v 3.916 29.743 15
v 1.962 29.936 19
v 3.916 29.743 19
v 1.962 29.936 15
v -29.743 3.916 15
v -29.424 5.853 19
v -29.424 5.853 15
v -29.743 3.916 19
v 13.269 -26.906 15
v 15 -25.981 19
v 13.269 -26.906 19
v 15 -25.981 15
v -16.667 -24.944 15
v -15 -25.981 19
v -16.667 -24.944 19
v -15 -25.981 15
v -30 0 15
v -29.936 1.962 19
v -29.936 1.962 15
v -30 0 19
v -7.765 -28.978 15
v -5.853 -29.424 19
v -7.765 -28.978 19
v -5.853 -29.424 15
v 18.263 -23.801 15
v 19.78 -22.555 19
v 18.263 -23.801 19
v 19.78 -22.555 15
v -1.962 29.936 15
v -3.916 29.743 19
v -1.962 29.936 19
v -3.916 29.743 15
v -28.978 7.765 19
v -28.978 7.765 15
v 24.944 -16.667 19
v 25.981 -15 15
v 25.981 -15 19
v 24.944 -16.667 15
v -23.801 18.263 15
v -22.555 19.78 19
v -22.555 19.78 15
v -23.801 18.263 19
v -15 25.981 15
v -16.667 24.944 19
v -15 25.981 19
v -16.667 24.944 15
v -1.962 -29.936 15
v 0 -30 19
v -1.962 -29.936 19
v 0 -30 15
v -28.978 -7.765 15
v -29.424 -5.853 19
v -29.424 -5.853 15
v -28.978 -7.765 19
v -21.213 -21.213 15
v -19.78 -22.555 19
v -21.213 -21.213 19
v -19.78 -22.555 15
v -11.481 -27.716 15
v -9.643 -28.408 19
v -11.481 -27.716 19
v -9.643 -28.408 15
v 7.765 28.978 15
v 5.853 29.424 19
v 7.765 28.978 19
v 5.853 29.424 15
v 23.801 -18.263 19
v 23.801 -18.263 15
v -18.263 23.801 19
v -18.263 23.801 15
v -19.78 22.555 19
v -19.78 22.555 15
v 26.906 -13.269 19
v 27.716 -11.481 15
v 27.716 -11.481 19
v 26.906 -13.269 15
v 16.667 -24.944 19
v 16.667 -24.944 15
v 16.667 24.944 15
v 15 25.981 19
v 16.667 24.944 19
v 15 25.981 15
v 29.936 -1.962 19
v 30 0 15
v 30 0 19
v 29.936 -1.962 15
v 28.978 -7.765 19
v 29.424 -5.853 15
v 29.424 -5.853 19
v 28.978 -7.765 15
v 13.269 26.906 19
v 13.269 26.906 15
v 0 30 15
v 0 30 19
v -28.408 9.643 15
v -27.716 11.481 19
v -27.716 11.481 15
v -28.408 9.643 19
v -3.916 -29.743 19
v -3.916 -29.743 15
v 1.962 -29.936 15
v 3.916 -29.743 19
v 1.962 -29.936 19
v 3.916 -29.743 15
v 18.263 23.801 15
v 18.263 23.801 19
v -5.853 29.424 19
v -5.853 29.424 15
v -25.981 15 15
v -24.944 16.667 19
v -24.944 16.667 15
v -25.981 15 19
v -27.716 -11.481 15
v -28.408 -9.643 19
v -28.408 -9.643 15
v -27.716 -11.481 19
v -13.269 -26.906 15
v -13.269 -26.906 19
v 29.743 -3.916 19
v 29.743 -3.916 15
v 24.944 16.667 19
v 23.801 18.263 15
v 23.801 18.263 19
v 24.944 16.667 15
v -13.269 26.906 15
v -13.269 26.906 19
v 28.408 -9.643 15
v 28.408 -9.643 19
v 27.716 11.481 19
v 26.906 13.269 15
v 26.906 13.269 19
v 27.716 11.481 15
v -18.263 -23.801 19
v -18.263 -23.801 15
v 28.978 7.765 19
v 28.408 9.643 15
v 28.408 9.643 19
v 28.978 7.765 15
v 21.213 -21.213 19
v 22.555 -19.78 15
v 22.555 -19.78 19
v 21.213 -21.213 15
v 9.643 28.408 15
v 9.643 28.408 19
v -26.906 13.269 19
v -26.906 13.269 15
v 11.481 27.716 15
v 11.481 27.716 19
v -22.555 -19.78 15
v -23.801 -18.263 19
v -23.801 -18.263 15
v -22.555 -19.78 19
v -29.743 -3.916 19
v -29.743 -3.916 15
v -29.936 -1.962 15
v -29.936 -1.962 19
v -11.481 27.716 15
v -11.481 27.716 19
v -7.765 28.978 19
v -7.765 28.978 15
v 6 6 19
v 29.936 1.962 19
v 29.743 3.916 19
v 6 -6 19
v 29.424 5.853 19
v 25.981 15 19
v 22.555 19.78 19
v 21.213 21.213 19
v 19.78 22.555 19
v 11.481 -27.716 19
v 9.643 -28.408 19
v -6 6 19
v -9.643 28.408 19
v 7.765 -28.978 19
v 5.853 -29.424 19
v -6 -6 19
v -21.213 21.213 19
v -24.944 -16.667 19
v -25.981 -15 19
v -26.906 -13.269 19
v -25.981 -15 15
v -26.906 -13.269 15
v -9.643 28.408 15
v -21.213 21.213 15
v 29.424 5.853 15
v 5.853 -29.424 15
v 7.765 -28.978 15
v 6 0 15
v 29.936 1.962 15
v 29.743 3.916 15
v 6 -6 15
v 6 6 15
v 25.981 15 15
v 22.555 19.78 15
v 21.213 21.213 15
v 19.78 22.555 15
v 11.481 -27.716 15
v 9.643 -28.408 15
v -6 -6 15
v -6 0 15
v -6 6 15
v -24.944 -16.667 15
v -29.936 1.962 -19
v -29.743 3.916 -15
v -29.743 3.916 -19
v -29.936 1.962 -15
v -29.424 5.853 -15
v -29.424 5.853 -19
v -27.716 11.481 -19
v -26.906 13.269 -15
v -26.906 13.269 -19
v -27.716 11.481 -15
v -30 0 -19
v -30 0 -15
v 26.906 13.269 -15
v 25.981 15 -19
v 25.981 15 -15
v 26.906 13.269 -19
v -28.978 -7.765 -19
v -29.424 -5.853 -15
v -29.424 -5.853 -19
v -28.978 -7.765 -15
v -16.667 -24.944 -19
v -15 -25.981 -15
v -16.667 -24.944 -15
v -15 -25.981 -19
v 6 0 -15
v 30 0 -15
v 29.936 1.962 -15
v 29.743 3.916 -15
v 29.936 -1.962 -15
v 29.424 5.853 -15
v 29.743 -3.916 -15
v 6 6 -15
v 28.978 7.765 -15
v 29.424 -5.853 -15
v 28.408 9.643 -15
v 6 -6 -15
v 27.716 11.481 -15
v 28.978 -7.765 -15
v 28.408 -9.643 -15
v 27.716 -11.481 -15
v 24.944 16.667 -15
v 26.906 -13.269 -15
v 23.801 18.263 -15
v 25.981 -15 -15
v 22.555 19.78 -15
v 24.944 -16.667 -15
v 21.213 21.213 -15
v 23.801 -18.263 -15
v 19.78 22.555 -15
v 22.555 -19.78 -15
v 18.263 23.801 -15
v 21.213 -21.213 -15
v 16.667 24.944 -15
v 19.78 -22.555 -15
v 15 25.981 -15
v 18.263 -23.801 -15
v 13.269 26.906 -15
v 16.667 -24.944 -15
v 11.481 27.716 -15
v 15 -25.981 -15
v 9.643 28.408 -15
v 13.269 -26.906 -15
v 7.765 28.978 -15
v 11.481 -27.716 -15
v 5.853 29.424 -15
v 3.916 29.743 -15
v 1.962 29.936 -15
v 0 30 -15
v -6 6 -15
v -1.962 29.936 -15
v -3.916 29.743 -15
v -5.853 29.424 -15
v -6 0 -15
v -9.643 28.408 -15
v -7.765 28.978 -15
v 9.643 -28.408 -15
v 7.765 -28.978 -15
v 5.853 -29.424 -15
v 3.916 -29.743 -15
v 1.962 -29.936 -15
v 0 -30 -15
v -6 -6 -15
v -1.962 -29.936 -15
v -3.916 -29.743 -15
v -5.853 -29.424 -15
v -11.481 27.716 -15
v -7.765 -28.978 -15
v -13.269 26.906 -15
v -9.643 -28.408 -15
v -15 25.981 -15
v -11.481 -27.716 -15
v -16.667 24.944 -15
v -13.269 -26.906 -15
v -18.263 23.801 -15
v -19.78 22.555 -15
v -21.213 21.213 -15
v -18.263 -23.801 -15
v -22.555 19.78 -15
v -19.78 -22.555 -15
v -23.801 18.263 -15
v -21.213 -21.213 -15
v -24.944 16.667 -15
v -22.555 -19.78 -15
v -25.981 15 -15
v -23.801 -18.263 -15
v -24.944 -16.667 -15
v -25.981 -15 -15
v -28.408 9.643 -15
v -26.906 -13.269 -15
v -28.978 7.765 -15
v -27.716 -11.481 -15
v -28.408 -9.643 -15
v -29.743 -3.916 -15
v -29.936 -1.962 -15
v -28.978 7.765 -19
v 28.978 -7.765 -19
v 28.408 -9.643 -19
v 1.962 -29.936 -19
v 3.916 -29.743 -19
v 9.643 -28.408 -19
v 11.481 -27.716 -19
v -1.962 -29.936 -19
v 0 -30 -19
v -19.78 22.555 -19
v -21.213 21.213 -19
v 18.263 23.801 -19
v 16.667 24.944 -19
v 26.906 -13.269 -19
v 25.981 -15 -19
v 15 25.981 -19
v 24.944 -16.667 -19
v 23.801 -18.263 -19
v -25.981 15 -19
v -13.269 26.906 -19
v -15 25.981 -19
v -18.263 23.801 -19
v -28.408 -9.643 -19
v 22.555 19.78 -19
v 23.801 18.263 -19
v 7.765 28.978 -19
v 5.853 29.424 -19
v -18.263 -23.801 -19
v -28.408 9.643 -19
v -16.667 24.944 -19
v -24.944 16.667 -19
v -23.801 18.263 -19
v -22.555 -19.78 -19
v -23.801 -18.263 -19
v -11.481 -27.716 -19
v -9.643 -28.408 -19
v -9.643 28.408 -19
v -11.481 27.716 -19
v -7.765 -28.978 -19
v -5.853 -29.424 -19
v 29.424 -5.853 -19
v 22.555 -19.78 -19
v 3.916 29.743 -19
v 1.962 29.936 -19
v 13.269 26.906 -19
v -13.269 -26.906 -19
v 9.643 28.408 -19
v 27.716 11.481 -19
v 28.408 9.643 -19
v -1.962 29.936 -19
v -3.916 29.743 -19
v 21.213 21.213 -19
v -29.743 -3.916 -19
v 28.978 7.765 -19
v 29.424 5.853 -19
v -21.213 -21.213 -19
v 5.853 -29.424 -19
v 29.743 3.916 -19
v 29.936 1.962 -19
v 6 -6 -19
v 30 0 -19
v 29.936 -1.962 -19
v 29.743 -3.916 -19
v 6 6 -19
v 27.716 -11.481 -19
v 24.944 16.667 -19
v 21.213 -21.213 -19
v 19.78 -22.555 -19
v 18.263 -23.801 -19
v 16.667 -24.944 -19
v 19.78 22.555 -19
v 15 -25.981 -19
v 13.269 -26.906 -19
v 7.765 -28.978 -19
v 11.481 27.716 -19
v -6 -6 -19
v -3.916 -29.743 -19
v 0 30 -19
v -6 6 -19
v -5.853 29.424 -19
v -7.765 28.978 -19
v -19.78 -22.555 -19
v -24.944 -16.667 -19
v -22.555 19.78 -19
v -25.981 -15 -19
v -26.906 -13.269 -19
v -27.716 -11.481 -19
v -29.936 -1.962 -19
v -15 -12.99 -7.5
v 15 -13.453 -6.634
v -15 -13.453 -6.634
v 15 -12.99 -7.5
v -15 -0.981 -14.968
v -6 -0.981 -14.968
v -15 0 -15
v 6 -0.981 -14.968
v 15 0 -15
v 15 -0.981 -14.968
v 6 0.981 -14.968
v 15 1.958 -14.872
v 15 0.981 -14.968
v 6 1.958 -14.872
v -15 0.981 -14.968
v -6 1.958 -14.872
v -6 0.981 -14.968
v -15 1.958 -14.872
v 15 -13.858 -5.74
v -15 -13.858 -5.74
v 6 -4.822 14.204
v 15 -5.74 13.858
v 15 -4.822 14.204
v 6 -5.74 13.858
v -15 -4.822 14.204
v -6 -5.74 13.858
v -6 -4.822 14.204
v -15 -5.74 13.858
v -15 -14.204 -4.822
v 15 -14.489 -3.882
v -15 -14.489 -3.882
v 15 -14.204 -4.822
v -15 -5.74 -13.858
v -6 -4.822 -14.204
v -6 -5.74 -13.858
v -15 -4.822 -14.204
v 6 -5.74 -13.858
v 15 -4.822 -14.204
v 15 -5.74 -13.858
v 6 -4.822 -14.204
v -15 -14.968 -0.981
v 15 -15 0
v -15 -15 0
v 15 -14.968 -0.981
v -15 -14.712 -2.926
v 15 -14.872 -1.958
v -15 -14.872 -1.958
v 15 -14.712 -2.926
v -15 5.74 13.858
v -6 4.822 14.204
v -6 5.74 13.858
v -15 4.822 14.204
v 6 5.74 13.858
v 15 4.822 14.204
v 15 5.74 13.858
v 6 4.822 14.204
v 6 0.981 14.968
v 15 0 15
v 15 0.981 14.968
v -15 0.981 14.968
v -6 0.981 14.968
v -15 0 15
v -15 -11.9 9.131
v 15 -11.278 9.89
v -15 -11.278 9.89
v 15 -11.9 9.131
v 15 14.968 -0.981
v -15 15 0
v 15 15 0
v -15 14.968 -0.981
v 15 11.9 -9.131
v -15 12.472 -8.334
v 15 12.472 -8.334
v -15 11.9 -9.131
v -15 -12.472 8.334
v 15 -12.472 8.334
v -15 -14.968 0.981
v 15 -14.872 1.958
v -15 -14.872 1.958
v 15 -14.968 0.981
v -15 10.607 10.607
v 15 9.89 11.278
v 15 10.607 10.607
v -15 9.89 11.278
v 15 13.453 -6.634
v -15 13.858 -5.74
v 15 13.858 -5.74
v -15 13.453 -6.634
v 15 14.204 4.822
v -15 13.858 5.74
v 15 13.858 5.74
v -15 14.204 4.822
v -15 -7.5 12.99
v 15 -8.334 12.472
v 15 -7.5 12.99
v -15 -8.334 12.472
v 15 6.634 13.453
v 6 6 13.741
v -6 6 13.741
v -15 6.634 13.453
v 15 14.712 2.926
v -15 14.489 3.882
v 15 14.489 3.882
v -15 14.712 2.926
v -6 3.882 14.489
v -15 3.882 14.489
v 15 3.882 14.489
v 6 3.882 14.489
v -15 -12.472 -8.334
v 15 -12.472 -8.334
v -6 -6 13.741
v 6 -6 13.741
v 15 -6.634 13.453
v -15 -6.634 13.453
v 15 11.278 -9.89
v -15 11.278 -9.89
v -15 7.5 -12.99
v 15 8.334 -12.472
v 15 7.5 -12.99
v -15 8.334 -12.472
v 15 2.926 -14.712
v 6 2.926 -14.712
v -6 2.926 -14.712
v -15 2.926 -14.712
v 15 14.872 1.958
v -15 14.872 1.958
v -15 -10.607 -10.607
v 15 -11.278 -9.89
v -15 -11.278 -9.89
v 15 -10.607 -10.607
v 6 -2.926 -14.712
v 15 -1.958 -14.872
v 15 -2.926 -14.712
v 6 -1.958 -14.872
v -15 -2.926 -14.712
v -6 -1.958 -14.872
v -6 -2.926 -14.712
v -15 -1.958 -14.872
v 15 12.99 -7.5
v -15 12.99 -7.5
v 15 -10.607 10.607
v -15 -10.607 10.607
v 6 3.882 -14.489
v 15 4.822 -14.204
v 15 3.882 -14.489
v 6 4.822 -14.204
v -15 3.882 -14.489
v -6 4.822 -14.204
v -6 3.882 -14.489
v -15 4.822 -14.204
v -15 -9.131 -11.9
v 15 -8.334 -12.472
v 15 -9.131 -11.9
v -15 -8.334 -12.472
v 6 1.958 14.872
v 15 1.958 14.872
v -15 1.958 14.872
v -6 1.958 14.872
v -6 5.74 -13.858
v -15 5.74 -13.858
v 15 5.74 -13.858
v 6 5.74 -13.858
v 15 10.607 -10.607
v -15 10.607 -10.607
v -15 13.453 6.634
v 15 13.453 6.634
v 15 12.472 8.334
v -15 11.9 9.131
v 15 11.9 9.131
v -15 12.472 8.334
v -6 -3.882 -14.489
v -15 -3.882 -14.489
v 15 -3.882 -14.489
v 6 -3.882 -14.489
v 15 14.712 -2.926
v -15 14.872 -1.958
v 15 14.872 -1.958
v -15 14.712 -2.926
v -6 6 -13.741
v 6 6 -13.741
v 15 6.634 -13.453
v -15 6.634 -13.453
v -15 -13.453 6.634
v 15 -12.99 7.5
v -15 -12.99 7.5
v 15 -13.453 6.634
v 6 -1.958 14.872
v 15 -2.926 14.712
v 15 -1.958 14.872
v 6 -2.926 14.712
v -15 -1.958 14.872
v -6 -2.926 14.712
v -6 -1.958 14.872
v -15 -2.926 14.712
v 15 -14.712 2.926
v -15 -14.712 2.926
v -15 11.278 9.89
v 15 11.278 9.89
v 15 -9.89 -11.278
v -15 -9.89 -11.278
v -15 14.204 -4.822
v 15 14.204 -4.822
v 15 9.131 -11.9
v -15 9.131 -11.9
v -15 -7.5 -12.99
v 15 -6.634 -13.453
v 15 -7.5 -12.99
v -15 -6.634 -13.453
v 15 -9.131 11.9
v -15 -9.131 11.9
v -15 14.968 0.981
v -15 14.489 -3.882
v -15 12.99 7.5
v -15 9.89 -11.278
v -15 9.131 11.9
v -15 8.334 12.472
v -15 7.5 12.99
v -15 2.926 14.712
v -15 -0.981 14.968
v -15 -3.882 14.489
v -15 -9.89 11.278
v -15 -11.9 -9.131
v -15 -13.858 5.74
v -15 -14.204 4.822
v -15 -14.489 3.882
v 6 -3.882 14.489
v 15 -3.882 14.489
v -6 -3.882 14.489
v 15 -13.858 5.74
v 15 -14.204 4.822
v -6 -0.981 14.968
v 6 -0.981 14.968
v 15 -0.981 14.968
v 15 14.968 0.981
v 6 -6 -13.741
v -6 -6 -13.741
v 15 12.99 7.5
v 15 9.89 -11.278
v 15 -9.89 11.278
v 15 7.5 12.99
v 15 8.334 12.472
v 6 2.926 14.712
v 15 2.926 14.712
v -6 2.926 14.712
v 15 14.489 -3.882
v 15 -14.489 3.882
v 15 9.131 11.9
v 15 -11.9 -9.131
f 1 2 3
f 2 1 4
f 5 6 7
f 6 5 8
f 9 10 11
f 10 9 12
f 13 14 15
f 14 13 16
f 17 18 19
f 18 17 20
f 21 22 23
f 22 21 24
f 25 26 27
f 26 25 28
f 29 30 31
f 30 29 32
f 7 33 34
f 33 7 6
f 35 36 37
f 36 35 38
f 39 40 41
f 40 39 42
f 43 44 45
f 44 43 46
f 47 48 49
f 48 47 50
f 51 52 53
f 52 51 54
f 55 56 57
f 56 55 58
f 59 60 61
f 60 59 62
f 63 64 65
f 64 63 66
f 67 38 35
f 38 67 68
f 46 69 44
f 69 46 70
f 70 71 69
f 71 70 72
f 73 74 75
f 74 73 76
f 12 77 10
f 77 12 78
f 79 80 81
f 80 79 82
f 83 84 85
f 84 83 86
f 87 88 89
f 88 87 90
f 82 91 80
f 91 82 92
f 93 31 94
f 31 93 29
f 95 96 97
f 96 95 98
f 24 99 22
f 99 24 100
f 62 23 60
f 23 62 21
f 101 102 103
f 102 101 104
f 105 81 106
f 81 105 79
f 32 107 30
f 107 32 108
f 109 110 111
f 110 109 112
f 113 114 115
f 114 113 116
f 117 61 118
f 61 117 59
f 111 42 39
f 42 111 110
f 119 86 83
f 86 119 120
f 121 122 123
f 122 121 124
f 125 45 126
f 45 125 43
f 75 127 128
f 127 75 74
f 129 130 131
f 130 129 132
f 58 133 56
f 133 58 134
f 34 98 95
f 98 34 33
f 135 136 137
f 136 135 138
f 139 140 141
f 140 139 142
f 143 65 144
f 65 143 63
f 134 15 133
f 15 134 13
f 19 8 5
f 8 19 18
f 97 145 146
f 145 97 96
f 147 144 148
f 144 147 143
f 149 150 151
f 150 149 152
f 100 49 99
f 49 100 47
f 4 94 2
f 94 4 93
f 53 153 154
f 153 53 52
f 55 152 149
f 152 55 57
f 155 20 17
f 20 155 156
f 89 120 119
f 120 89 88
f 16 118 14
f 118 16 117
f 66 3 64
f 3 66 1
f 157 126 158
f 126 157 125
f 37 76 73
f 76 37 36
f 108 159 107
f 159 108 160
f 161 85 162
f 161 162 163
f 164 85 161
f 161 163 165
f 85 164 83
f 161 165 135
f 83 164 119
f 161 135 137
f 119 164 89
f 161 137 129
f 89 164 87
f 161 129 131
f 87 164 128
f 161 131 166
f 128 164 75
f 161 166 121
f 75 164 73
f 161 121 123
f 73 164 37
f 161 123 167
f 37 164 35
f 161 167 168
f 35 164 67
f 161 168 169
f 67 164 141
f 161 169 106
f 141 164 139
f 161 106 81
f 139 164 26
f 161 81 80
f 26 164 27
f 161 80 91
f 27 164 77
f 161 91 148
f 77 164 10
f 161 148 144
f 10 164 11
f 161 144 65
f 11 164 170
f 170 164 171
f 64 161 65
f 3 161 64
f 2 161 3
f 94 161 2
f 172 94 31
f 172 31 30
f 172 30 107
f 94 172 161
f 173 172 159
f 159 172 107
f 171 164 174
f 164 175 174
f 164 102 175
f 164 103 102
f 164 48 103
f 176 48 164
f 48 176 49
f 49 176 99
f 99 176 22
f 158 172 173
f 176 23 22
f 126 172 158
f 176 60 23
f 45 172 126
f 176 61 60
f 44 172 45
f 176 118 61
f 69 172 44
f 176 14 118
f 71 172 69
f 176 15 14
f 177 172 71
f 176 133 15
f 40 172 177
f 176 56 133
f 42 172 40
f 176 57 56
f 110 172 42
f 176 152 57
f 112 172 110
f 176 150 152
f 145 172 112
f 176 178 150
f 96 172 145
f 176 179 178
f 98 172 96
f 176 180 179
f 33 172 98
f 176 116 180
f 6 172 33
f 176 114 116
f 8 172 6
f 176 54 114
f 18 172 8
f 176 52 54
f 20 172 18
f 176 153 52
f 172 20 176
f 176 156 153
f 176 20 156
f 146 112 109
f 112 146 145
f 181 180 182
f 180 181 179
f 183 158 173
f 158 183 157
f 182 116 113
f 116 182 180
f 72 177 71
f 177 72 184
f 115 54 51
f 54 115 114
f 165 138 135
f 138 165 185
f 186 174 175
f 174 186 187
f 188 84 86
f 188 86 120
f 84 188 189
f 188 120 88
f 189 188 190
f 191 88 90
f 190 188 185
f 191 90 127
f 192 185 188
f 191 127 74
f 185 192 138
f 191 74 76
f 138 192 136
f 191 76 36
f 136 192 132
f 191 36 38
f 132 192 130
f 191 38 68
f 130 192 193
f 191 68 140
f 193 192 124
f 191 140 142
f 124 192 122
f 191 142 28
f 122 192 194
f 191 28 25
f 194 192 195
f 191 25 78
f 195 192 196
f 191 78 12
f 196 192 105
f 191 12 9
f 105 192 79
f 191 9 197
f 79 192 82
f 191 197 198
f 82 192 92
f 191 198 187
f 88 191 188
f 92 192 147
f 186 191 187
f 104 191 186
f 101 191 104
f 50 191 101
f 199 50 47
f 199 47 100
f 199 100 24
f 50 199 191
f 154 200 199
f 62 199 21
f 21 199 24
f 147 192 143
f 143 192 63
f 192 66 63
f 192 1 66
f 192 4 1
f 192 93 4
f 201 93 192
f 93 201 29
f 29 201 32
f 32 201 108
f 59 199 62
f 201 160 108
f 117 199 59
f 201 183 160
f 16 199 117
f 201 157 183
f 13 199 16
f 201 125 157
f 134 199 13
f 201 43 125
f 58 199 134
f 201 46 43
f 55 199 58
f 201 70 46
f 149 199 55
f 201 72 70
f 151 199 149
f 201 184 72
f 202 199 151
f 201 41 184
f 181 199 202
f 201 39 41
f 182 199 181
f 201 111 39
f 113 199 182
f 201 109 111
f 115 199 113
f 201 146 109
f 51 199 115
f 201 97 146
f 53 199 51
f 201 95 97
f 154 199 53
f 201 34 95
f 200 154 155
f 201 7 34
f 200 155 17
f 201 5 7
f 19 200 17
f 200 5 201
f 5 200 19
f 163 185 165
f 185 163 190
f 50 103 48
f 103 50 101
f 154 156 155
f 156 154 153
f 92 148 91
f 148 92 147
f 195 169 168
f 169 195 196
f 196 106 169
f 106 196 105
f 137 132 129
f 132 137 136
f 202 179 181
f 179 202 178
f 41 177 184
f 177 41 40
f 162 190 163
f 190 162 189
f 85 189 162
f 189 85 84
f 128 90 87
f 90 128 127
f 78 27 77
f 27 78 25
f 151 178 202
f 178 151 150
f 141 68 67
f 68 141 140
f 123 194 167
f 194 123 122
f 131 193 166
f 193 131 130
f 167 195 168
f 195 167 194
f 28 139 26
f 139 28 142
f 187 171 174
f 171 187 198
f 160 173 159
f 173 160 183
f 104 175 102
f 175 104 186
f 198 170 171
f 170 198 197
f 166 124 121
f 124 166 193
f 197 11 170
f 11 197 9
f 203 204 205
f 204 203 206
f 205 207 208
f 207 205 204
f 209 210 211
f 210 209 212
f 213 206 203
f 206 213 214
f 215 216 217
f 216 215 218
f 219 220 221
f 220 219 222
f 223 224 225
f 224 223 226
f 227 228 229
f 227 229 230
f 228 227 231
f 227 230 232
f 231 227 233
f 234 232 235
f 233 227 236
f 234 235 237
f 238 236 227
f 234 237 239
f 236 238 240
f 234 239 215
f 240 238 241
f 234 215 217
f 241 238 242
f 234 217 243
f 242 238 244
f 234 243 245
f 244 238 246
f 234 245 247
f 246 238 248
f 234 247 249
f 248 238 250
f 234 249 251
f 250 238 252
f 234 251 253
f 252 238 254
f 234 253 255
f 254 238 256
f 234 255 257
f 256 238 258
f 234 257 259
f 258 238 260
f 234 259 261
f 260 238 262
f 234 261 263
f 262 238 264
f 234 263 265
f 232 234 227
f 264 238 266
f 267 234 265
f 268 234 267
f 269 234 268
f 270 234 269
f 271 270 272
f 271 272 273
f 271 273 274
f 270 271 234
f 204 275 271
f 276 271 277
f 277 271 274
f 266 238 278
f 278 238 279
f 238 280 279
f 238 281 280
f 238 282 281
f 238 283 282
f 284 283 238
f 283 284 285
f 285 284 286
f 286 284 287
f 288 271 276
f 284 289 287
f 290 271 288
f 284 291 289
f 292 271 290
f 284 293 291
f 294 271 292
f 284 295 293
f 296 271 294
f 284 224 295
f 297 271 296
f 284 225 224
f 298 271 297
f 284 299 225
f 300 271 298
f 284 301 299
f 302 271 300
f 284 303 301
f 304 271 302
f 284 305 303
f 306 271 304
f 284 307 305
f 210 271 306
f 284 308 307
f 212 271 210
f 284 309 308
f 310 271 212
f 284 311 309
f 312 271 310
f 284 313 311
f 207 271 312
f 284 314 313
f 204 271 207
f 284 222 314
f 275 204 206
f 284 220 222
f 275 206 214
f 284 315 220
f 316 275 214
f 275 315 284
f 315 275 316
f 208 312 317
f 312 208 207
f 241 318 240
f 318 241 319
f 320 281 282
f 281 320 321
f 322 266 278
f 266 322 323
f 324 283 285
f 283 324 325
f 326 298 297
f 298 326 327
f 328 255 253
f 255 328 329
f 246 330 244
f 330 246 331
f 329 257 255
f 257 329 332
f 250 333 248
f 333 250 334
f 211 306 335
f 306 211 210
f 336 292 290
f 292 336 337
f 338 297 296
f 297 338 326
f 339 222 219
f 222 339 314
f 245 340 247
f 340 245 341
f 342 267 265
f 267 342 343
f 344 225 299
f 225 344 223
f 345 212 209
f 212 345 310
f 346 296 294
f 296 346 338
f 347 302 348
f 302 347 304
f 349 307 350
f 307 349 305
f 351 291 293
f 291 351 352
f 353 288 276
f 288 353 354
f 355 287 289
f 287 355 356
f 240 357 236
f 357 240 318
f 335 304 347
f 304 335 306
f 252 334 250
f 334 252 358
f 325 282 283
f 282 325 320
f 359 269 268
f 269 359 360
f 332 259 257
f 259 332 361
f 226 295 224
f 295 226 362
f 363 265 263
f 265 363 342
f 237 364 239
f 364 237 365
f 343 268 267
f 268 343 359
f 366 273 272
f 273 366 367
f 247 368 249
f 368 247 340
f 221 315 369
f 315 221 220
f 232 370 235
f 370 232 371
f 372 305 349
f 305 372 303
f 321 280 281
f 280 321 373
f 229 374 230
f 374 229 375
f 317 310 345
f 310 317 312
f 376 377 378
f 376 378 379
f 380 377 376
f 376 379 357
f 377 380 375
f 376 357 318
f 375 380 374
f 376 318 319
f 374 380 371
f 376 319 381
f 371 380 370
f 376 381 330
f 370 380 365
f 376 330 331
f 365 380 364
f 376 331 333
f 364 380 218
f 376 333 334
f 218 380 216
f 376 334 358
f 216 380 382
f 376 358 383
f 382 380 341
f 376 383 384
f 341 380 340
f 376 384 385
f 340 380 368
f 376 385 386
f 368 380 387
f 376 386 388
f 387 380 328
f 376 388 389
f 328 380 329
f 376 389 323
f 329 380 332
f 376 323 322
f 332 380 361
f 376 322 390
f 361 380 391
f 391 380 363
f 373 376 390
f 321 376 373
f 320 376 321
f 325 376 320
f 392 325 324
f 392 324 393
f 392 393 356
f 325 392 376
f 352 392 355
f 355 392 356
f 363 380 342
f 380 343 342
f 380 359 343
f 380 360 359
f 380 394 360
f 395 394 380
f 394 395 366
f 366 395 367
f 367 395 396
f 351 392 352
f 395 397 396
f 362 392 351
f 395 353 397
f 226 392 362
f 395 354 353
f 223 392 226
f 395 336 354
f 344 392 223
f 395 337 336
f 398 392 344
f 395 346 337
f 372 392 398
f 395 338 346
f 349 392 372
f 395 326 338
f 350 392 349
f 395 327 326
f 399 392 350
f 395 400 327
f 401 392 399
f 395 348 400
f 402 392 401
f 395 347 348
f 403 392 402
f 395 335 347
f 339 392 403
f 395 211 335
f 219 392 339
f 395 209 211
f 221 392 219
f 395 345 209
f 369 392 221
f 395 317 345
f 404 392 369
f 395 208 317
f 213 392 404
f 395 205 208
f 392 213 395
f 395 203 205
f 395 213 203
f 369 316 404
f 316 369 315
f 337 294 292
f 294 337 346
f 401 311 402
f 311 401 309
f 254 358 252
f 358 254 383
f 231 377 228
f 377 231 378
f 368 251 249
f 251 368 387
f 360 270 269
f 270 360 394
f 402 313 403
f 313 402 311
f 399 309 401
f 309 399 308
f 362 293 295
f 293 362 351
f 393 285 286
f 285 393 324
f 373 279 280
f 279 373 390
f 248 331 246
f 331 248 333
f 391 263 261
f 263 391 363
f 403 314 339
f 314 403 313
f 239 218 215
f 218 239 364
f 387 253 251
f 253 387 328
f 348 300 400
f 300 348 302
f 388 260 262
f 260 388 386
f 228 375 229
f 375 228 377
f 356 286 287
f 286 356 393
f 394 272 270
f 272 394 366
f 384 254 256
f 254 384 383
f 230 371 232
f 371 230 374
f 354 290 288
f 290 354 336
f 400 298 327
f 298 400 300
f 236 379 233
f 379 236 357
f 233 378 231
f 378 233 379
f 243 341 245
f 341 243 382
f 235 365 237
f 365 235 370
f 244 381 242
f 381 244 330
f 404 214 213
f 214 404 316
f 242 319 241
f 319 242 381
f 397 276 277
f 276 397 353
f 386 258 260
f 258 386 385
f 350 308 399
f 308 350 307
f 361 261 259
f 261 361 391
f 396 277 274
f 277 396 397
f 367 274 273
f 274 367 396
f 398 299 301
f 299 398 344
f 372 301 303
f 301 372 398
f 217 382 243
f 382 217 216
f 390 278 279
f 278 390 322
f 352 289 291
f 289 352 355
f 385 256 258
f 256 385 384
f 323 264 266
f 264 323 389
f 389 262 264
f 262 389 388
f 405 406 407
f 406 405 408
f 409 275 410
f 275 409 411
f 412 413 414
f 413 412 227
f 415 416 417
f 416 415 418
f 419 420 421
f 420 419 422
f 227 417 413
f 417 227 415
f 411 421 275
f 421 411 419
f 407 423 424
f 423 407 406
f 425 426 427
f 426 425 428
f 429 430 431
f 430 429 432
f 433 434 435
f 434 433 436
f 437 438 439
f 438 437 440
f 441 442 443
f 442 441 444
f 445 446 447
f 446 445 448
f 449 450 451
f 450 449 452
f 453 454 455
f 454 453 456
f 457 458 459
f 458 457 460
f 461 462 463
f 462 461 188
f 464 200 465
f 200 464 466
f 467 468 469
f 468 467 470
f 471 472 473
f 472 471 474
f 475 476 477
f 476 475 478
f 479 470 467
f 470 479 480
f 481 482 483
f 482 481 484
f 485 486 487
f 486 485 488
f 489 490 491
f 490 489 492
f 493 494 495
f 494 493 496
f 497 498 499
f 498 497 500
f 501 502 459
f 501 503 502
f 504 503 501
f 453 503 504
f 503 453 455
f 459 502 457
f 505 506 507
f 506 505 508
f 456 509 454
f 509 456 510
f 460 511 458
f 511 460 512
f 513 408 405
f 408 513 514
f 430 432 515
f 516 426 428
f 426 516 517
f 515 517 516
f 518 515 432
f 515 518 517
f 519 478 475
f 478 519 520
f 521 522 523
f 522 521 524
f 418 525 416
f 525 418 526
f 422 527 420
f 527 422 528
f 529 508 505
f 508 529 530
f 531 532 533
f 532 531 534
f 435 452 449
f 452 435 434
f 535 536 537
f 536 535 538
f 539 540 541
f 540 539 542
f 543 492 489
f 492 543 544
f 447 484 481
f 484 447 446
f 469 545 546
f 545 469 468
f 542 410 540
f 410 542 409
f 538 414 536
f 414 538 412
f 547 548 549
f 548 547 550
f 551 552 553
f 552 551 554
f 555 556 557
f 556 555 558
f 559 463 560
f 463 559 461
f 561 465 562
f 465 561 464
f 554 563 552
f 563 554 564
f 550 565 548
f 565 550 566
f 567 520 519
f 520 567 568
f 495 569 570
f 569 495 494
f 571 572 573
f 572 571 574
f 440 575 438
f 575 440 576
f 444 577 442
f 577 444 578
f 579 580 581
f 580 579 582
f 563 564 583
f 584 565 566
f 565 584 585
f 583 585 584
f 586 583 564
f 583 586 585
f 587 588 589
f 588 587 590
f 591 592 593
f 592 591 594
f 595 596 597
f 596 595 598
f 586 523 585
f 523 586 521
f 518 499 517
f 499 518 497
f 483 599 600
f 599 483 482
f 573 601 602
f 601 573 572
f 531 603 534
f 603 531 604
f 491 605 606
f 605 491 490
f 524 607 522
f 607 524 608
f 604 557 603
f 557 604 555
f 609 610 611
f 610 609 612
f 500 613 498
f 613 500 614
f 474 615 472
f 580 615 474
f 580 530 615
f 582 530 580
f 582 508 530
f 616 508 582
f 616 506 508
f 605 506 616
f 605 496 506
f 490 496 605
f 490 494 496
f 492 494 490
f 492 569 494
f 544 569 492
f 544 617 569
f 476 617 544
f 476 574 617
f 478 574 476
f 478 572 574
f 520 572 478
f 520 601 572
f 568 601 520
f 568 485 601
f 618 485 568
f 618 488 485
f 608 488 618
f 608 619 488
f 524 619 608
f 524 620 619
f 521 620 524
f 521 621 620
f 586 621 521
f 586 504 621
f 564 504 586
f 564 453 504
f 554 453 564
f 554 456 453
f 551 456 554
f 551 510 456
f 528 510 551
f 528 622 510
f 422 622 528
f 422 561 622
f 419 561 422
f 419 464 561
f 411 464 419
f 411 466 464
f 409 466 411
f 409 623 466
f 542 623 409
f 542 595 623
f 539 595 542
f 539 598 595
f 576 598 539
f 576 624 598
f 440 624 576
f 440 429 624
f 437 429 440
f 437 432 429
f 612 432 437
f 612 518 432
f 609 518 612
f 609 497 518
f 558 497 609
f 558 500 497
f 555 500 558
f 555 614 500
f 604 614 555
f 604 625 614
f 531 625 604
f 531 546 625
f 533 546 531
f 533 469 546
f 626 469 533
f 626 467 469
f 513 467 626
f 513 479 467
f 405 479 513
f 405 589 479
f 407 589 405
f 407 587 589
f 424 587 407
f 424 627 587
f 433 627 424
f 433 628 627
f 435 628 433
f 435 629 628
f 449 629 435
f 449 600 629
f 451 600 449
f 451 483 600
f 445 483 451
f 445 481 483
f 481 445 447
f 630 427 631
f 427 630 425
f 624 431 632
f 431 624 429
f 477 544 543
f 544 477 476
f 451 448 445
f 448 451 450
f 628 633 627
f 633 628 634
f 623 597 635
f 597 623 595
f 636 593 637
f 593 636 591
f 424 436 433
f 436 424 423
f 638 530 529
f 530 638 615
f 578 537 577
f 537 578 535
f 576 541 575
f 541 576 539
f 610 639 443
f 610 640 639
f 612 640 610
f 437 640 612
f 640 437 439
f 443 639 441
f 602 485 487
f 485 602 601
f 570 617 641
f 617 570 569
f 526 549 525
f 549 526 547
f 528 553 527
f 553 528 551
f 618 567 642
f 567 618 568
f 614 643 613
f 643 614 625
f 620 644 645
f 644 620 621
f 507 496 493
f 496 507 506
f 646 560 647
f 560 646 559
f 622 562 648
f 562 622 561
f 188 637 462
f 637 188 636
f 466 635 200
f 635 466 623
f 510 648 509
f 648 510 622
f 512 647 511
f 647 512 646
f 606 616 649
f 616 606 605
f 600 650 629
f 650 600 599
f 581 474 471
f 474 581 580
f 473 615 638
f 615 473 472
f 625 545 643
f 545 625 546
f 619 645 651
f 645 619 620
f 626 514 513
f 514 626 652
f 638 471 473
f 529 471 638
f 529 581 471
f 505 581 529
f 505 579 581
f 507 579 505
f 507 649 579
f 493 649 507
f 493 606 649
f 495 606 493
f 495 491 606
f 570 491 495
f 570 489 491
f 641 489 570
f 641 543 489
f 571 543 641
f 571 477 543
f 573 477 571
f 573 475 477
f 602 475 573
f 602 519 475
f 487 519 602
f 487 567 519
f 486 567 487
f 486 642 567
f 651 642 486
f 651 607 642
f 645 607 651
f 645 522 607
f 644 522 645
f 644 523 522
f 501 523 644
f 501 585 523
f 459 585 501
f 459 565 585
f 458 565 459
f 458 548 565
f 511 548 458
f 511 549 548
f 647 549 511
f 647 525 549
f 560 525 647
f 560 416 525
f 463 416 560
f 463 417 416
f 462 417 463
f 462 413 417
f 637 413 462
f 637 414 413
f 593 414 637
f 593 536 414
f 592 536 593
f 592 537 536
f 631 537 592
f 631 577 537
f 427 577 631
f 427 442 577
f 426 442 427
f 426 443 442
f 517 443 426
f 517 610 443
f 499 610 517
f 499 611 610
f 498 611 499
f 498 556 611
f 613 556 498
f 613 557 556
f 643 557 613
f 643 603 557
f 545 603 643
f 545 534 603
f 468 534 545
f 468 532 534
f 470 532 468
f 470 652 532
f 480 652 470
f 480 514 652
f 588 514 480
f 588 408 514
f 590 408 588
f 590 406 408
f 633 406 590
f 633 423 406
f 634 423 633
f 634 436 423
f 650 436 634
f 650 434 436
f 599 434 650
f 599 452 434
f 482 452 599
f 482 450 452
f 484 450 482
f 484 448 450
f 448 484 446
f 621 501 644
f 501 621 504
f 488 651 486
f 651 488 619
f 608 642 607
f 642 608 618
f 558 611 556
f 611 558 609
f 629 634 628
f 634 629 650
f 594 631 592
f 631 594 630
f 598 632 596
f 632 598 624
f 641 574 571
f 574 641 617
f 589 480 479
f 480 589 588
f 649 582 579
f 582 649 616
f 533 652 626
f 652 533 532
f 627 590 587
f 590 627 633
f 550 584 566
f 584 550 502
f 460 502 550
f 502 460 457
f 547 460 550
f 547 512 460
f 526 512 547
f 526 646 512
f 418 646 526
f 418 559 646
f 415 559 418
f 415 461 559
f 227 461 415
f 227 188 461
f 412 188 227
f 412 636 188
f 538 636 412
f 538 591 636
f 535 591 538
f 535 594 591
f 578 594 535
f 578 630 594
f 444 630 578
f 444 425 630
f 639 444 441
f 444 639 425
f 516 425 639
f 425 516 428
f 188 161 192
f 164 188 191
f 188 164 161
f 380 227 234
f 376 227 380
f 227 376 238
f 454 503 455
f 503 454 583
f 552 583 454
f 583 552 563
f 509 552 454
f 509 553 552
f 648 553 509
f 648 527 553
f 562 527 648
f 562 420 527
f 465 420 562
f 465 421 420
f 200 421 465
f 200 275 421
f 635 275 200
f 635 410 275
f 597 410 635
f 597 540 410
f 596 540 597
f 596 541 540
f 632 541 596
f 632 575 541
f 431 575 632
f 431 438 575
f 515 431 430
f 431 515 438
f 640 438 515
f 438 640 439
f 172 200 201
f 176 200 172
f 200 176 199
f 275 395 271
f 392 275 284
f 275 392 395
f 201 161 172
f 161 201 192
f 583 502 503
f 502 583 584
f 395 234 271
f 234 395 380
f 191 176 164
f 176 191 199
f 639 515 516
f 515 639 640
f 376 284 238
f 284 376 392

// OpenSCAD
barrel_radius = 15;
barrel_length = 30;
flange_radius = 30;
flange_thickness = 4;
square_bore = 12;

module spool() {
  difference() {
    union() {
      cylinder(h = barrel_length, r = barrel_radius, center = true, $fn = 96);

      for (offset = [
        -(barrel_length + flange_thickness) / 2,
        (barrel_length + flange_thickness) / 2,
      ]) {
        translate([offset, 0, 0])
          rotate([0, 90, 0])
            cylinder(h = flange_thickness, r = flange_radius, center = true, $fn = 96);
      }
    }

    cube([barrel_length + flange_thickness * 2 + 2, square_bore, square_bore], center = true);
  }
}

rotate([0, 90, 0]) spool();
